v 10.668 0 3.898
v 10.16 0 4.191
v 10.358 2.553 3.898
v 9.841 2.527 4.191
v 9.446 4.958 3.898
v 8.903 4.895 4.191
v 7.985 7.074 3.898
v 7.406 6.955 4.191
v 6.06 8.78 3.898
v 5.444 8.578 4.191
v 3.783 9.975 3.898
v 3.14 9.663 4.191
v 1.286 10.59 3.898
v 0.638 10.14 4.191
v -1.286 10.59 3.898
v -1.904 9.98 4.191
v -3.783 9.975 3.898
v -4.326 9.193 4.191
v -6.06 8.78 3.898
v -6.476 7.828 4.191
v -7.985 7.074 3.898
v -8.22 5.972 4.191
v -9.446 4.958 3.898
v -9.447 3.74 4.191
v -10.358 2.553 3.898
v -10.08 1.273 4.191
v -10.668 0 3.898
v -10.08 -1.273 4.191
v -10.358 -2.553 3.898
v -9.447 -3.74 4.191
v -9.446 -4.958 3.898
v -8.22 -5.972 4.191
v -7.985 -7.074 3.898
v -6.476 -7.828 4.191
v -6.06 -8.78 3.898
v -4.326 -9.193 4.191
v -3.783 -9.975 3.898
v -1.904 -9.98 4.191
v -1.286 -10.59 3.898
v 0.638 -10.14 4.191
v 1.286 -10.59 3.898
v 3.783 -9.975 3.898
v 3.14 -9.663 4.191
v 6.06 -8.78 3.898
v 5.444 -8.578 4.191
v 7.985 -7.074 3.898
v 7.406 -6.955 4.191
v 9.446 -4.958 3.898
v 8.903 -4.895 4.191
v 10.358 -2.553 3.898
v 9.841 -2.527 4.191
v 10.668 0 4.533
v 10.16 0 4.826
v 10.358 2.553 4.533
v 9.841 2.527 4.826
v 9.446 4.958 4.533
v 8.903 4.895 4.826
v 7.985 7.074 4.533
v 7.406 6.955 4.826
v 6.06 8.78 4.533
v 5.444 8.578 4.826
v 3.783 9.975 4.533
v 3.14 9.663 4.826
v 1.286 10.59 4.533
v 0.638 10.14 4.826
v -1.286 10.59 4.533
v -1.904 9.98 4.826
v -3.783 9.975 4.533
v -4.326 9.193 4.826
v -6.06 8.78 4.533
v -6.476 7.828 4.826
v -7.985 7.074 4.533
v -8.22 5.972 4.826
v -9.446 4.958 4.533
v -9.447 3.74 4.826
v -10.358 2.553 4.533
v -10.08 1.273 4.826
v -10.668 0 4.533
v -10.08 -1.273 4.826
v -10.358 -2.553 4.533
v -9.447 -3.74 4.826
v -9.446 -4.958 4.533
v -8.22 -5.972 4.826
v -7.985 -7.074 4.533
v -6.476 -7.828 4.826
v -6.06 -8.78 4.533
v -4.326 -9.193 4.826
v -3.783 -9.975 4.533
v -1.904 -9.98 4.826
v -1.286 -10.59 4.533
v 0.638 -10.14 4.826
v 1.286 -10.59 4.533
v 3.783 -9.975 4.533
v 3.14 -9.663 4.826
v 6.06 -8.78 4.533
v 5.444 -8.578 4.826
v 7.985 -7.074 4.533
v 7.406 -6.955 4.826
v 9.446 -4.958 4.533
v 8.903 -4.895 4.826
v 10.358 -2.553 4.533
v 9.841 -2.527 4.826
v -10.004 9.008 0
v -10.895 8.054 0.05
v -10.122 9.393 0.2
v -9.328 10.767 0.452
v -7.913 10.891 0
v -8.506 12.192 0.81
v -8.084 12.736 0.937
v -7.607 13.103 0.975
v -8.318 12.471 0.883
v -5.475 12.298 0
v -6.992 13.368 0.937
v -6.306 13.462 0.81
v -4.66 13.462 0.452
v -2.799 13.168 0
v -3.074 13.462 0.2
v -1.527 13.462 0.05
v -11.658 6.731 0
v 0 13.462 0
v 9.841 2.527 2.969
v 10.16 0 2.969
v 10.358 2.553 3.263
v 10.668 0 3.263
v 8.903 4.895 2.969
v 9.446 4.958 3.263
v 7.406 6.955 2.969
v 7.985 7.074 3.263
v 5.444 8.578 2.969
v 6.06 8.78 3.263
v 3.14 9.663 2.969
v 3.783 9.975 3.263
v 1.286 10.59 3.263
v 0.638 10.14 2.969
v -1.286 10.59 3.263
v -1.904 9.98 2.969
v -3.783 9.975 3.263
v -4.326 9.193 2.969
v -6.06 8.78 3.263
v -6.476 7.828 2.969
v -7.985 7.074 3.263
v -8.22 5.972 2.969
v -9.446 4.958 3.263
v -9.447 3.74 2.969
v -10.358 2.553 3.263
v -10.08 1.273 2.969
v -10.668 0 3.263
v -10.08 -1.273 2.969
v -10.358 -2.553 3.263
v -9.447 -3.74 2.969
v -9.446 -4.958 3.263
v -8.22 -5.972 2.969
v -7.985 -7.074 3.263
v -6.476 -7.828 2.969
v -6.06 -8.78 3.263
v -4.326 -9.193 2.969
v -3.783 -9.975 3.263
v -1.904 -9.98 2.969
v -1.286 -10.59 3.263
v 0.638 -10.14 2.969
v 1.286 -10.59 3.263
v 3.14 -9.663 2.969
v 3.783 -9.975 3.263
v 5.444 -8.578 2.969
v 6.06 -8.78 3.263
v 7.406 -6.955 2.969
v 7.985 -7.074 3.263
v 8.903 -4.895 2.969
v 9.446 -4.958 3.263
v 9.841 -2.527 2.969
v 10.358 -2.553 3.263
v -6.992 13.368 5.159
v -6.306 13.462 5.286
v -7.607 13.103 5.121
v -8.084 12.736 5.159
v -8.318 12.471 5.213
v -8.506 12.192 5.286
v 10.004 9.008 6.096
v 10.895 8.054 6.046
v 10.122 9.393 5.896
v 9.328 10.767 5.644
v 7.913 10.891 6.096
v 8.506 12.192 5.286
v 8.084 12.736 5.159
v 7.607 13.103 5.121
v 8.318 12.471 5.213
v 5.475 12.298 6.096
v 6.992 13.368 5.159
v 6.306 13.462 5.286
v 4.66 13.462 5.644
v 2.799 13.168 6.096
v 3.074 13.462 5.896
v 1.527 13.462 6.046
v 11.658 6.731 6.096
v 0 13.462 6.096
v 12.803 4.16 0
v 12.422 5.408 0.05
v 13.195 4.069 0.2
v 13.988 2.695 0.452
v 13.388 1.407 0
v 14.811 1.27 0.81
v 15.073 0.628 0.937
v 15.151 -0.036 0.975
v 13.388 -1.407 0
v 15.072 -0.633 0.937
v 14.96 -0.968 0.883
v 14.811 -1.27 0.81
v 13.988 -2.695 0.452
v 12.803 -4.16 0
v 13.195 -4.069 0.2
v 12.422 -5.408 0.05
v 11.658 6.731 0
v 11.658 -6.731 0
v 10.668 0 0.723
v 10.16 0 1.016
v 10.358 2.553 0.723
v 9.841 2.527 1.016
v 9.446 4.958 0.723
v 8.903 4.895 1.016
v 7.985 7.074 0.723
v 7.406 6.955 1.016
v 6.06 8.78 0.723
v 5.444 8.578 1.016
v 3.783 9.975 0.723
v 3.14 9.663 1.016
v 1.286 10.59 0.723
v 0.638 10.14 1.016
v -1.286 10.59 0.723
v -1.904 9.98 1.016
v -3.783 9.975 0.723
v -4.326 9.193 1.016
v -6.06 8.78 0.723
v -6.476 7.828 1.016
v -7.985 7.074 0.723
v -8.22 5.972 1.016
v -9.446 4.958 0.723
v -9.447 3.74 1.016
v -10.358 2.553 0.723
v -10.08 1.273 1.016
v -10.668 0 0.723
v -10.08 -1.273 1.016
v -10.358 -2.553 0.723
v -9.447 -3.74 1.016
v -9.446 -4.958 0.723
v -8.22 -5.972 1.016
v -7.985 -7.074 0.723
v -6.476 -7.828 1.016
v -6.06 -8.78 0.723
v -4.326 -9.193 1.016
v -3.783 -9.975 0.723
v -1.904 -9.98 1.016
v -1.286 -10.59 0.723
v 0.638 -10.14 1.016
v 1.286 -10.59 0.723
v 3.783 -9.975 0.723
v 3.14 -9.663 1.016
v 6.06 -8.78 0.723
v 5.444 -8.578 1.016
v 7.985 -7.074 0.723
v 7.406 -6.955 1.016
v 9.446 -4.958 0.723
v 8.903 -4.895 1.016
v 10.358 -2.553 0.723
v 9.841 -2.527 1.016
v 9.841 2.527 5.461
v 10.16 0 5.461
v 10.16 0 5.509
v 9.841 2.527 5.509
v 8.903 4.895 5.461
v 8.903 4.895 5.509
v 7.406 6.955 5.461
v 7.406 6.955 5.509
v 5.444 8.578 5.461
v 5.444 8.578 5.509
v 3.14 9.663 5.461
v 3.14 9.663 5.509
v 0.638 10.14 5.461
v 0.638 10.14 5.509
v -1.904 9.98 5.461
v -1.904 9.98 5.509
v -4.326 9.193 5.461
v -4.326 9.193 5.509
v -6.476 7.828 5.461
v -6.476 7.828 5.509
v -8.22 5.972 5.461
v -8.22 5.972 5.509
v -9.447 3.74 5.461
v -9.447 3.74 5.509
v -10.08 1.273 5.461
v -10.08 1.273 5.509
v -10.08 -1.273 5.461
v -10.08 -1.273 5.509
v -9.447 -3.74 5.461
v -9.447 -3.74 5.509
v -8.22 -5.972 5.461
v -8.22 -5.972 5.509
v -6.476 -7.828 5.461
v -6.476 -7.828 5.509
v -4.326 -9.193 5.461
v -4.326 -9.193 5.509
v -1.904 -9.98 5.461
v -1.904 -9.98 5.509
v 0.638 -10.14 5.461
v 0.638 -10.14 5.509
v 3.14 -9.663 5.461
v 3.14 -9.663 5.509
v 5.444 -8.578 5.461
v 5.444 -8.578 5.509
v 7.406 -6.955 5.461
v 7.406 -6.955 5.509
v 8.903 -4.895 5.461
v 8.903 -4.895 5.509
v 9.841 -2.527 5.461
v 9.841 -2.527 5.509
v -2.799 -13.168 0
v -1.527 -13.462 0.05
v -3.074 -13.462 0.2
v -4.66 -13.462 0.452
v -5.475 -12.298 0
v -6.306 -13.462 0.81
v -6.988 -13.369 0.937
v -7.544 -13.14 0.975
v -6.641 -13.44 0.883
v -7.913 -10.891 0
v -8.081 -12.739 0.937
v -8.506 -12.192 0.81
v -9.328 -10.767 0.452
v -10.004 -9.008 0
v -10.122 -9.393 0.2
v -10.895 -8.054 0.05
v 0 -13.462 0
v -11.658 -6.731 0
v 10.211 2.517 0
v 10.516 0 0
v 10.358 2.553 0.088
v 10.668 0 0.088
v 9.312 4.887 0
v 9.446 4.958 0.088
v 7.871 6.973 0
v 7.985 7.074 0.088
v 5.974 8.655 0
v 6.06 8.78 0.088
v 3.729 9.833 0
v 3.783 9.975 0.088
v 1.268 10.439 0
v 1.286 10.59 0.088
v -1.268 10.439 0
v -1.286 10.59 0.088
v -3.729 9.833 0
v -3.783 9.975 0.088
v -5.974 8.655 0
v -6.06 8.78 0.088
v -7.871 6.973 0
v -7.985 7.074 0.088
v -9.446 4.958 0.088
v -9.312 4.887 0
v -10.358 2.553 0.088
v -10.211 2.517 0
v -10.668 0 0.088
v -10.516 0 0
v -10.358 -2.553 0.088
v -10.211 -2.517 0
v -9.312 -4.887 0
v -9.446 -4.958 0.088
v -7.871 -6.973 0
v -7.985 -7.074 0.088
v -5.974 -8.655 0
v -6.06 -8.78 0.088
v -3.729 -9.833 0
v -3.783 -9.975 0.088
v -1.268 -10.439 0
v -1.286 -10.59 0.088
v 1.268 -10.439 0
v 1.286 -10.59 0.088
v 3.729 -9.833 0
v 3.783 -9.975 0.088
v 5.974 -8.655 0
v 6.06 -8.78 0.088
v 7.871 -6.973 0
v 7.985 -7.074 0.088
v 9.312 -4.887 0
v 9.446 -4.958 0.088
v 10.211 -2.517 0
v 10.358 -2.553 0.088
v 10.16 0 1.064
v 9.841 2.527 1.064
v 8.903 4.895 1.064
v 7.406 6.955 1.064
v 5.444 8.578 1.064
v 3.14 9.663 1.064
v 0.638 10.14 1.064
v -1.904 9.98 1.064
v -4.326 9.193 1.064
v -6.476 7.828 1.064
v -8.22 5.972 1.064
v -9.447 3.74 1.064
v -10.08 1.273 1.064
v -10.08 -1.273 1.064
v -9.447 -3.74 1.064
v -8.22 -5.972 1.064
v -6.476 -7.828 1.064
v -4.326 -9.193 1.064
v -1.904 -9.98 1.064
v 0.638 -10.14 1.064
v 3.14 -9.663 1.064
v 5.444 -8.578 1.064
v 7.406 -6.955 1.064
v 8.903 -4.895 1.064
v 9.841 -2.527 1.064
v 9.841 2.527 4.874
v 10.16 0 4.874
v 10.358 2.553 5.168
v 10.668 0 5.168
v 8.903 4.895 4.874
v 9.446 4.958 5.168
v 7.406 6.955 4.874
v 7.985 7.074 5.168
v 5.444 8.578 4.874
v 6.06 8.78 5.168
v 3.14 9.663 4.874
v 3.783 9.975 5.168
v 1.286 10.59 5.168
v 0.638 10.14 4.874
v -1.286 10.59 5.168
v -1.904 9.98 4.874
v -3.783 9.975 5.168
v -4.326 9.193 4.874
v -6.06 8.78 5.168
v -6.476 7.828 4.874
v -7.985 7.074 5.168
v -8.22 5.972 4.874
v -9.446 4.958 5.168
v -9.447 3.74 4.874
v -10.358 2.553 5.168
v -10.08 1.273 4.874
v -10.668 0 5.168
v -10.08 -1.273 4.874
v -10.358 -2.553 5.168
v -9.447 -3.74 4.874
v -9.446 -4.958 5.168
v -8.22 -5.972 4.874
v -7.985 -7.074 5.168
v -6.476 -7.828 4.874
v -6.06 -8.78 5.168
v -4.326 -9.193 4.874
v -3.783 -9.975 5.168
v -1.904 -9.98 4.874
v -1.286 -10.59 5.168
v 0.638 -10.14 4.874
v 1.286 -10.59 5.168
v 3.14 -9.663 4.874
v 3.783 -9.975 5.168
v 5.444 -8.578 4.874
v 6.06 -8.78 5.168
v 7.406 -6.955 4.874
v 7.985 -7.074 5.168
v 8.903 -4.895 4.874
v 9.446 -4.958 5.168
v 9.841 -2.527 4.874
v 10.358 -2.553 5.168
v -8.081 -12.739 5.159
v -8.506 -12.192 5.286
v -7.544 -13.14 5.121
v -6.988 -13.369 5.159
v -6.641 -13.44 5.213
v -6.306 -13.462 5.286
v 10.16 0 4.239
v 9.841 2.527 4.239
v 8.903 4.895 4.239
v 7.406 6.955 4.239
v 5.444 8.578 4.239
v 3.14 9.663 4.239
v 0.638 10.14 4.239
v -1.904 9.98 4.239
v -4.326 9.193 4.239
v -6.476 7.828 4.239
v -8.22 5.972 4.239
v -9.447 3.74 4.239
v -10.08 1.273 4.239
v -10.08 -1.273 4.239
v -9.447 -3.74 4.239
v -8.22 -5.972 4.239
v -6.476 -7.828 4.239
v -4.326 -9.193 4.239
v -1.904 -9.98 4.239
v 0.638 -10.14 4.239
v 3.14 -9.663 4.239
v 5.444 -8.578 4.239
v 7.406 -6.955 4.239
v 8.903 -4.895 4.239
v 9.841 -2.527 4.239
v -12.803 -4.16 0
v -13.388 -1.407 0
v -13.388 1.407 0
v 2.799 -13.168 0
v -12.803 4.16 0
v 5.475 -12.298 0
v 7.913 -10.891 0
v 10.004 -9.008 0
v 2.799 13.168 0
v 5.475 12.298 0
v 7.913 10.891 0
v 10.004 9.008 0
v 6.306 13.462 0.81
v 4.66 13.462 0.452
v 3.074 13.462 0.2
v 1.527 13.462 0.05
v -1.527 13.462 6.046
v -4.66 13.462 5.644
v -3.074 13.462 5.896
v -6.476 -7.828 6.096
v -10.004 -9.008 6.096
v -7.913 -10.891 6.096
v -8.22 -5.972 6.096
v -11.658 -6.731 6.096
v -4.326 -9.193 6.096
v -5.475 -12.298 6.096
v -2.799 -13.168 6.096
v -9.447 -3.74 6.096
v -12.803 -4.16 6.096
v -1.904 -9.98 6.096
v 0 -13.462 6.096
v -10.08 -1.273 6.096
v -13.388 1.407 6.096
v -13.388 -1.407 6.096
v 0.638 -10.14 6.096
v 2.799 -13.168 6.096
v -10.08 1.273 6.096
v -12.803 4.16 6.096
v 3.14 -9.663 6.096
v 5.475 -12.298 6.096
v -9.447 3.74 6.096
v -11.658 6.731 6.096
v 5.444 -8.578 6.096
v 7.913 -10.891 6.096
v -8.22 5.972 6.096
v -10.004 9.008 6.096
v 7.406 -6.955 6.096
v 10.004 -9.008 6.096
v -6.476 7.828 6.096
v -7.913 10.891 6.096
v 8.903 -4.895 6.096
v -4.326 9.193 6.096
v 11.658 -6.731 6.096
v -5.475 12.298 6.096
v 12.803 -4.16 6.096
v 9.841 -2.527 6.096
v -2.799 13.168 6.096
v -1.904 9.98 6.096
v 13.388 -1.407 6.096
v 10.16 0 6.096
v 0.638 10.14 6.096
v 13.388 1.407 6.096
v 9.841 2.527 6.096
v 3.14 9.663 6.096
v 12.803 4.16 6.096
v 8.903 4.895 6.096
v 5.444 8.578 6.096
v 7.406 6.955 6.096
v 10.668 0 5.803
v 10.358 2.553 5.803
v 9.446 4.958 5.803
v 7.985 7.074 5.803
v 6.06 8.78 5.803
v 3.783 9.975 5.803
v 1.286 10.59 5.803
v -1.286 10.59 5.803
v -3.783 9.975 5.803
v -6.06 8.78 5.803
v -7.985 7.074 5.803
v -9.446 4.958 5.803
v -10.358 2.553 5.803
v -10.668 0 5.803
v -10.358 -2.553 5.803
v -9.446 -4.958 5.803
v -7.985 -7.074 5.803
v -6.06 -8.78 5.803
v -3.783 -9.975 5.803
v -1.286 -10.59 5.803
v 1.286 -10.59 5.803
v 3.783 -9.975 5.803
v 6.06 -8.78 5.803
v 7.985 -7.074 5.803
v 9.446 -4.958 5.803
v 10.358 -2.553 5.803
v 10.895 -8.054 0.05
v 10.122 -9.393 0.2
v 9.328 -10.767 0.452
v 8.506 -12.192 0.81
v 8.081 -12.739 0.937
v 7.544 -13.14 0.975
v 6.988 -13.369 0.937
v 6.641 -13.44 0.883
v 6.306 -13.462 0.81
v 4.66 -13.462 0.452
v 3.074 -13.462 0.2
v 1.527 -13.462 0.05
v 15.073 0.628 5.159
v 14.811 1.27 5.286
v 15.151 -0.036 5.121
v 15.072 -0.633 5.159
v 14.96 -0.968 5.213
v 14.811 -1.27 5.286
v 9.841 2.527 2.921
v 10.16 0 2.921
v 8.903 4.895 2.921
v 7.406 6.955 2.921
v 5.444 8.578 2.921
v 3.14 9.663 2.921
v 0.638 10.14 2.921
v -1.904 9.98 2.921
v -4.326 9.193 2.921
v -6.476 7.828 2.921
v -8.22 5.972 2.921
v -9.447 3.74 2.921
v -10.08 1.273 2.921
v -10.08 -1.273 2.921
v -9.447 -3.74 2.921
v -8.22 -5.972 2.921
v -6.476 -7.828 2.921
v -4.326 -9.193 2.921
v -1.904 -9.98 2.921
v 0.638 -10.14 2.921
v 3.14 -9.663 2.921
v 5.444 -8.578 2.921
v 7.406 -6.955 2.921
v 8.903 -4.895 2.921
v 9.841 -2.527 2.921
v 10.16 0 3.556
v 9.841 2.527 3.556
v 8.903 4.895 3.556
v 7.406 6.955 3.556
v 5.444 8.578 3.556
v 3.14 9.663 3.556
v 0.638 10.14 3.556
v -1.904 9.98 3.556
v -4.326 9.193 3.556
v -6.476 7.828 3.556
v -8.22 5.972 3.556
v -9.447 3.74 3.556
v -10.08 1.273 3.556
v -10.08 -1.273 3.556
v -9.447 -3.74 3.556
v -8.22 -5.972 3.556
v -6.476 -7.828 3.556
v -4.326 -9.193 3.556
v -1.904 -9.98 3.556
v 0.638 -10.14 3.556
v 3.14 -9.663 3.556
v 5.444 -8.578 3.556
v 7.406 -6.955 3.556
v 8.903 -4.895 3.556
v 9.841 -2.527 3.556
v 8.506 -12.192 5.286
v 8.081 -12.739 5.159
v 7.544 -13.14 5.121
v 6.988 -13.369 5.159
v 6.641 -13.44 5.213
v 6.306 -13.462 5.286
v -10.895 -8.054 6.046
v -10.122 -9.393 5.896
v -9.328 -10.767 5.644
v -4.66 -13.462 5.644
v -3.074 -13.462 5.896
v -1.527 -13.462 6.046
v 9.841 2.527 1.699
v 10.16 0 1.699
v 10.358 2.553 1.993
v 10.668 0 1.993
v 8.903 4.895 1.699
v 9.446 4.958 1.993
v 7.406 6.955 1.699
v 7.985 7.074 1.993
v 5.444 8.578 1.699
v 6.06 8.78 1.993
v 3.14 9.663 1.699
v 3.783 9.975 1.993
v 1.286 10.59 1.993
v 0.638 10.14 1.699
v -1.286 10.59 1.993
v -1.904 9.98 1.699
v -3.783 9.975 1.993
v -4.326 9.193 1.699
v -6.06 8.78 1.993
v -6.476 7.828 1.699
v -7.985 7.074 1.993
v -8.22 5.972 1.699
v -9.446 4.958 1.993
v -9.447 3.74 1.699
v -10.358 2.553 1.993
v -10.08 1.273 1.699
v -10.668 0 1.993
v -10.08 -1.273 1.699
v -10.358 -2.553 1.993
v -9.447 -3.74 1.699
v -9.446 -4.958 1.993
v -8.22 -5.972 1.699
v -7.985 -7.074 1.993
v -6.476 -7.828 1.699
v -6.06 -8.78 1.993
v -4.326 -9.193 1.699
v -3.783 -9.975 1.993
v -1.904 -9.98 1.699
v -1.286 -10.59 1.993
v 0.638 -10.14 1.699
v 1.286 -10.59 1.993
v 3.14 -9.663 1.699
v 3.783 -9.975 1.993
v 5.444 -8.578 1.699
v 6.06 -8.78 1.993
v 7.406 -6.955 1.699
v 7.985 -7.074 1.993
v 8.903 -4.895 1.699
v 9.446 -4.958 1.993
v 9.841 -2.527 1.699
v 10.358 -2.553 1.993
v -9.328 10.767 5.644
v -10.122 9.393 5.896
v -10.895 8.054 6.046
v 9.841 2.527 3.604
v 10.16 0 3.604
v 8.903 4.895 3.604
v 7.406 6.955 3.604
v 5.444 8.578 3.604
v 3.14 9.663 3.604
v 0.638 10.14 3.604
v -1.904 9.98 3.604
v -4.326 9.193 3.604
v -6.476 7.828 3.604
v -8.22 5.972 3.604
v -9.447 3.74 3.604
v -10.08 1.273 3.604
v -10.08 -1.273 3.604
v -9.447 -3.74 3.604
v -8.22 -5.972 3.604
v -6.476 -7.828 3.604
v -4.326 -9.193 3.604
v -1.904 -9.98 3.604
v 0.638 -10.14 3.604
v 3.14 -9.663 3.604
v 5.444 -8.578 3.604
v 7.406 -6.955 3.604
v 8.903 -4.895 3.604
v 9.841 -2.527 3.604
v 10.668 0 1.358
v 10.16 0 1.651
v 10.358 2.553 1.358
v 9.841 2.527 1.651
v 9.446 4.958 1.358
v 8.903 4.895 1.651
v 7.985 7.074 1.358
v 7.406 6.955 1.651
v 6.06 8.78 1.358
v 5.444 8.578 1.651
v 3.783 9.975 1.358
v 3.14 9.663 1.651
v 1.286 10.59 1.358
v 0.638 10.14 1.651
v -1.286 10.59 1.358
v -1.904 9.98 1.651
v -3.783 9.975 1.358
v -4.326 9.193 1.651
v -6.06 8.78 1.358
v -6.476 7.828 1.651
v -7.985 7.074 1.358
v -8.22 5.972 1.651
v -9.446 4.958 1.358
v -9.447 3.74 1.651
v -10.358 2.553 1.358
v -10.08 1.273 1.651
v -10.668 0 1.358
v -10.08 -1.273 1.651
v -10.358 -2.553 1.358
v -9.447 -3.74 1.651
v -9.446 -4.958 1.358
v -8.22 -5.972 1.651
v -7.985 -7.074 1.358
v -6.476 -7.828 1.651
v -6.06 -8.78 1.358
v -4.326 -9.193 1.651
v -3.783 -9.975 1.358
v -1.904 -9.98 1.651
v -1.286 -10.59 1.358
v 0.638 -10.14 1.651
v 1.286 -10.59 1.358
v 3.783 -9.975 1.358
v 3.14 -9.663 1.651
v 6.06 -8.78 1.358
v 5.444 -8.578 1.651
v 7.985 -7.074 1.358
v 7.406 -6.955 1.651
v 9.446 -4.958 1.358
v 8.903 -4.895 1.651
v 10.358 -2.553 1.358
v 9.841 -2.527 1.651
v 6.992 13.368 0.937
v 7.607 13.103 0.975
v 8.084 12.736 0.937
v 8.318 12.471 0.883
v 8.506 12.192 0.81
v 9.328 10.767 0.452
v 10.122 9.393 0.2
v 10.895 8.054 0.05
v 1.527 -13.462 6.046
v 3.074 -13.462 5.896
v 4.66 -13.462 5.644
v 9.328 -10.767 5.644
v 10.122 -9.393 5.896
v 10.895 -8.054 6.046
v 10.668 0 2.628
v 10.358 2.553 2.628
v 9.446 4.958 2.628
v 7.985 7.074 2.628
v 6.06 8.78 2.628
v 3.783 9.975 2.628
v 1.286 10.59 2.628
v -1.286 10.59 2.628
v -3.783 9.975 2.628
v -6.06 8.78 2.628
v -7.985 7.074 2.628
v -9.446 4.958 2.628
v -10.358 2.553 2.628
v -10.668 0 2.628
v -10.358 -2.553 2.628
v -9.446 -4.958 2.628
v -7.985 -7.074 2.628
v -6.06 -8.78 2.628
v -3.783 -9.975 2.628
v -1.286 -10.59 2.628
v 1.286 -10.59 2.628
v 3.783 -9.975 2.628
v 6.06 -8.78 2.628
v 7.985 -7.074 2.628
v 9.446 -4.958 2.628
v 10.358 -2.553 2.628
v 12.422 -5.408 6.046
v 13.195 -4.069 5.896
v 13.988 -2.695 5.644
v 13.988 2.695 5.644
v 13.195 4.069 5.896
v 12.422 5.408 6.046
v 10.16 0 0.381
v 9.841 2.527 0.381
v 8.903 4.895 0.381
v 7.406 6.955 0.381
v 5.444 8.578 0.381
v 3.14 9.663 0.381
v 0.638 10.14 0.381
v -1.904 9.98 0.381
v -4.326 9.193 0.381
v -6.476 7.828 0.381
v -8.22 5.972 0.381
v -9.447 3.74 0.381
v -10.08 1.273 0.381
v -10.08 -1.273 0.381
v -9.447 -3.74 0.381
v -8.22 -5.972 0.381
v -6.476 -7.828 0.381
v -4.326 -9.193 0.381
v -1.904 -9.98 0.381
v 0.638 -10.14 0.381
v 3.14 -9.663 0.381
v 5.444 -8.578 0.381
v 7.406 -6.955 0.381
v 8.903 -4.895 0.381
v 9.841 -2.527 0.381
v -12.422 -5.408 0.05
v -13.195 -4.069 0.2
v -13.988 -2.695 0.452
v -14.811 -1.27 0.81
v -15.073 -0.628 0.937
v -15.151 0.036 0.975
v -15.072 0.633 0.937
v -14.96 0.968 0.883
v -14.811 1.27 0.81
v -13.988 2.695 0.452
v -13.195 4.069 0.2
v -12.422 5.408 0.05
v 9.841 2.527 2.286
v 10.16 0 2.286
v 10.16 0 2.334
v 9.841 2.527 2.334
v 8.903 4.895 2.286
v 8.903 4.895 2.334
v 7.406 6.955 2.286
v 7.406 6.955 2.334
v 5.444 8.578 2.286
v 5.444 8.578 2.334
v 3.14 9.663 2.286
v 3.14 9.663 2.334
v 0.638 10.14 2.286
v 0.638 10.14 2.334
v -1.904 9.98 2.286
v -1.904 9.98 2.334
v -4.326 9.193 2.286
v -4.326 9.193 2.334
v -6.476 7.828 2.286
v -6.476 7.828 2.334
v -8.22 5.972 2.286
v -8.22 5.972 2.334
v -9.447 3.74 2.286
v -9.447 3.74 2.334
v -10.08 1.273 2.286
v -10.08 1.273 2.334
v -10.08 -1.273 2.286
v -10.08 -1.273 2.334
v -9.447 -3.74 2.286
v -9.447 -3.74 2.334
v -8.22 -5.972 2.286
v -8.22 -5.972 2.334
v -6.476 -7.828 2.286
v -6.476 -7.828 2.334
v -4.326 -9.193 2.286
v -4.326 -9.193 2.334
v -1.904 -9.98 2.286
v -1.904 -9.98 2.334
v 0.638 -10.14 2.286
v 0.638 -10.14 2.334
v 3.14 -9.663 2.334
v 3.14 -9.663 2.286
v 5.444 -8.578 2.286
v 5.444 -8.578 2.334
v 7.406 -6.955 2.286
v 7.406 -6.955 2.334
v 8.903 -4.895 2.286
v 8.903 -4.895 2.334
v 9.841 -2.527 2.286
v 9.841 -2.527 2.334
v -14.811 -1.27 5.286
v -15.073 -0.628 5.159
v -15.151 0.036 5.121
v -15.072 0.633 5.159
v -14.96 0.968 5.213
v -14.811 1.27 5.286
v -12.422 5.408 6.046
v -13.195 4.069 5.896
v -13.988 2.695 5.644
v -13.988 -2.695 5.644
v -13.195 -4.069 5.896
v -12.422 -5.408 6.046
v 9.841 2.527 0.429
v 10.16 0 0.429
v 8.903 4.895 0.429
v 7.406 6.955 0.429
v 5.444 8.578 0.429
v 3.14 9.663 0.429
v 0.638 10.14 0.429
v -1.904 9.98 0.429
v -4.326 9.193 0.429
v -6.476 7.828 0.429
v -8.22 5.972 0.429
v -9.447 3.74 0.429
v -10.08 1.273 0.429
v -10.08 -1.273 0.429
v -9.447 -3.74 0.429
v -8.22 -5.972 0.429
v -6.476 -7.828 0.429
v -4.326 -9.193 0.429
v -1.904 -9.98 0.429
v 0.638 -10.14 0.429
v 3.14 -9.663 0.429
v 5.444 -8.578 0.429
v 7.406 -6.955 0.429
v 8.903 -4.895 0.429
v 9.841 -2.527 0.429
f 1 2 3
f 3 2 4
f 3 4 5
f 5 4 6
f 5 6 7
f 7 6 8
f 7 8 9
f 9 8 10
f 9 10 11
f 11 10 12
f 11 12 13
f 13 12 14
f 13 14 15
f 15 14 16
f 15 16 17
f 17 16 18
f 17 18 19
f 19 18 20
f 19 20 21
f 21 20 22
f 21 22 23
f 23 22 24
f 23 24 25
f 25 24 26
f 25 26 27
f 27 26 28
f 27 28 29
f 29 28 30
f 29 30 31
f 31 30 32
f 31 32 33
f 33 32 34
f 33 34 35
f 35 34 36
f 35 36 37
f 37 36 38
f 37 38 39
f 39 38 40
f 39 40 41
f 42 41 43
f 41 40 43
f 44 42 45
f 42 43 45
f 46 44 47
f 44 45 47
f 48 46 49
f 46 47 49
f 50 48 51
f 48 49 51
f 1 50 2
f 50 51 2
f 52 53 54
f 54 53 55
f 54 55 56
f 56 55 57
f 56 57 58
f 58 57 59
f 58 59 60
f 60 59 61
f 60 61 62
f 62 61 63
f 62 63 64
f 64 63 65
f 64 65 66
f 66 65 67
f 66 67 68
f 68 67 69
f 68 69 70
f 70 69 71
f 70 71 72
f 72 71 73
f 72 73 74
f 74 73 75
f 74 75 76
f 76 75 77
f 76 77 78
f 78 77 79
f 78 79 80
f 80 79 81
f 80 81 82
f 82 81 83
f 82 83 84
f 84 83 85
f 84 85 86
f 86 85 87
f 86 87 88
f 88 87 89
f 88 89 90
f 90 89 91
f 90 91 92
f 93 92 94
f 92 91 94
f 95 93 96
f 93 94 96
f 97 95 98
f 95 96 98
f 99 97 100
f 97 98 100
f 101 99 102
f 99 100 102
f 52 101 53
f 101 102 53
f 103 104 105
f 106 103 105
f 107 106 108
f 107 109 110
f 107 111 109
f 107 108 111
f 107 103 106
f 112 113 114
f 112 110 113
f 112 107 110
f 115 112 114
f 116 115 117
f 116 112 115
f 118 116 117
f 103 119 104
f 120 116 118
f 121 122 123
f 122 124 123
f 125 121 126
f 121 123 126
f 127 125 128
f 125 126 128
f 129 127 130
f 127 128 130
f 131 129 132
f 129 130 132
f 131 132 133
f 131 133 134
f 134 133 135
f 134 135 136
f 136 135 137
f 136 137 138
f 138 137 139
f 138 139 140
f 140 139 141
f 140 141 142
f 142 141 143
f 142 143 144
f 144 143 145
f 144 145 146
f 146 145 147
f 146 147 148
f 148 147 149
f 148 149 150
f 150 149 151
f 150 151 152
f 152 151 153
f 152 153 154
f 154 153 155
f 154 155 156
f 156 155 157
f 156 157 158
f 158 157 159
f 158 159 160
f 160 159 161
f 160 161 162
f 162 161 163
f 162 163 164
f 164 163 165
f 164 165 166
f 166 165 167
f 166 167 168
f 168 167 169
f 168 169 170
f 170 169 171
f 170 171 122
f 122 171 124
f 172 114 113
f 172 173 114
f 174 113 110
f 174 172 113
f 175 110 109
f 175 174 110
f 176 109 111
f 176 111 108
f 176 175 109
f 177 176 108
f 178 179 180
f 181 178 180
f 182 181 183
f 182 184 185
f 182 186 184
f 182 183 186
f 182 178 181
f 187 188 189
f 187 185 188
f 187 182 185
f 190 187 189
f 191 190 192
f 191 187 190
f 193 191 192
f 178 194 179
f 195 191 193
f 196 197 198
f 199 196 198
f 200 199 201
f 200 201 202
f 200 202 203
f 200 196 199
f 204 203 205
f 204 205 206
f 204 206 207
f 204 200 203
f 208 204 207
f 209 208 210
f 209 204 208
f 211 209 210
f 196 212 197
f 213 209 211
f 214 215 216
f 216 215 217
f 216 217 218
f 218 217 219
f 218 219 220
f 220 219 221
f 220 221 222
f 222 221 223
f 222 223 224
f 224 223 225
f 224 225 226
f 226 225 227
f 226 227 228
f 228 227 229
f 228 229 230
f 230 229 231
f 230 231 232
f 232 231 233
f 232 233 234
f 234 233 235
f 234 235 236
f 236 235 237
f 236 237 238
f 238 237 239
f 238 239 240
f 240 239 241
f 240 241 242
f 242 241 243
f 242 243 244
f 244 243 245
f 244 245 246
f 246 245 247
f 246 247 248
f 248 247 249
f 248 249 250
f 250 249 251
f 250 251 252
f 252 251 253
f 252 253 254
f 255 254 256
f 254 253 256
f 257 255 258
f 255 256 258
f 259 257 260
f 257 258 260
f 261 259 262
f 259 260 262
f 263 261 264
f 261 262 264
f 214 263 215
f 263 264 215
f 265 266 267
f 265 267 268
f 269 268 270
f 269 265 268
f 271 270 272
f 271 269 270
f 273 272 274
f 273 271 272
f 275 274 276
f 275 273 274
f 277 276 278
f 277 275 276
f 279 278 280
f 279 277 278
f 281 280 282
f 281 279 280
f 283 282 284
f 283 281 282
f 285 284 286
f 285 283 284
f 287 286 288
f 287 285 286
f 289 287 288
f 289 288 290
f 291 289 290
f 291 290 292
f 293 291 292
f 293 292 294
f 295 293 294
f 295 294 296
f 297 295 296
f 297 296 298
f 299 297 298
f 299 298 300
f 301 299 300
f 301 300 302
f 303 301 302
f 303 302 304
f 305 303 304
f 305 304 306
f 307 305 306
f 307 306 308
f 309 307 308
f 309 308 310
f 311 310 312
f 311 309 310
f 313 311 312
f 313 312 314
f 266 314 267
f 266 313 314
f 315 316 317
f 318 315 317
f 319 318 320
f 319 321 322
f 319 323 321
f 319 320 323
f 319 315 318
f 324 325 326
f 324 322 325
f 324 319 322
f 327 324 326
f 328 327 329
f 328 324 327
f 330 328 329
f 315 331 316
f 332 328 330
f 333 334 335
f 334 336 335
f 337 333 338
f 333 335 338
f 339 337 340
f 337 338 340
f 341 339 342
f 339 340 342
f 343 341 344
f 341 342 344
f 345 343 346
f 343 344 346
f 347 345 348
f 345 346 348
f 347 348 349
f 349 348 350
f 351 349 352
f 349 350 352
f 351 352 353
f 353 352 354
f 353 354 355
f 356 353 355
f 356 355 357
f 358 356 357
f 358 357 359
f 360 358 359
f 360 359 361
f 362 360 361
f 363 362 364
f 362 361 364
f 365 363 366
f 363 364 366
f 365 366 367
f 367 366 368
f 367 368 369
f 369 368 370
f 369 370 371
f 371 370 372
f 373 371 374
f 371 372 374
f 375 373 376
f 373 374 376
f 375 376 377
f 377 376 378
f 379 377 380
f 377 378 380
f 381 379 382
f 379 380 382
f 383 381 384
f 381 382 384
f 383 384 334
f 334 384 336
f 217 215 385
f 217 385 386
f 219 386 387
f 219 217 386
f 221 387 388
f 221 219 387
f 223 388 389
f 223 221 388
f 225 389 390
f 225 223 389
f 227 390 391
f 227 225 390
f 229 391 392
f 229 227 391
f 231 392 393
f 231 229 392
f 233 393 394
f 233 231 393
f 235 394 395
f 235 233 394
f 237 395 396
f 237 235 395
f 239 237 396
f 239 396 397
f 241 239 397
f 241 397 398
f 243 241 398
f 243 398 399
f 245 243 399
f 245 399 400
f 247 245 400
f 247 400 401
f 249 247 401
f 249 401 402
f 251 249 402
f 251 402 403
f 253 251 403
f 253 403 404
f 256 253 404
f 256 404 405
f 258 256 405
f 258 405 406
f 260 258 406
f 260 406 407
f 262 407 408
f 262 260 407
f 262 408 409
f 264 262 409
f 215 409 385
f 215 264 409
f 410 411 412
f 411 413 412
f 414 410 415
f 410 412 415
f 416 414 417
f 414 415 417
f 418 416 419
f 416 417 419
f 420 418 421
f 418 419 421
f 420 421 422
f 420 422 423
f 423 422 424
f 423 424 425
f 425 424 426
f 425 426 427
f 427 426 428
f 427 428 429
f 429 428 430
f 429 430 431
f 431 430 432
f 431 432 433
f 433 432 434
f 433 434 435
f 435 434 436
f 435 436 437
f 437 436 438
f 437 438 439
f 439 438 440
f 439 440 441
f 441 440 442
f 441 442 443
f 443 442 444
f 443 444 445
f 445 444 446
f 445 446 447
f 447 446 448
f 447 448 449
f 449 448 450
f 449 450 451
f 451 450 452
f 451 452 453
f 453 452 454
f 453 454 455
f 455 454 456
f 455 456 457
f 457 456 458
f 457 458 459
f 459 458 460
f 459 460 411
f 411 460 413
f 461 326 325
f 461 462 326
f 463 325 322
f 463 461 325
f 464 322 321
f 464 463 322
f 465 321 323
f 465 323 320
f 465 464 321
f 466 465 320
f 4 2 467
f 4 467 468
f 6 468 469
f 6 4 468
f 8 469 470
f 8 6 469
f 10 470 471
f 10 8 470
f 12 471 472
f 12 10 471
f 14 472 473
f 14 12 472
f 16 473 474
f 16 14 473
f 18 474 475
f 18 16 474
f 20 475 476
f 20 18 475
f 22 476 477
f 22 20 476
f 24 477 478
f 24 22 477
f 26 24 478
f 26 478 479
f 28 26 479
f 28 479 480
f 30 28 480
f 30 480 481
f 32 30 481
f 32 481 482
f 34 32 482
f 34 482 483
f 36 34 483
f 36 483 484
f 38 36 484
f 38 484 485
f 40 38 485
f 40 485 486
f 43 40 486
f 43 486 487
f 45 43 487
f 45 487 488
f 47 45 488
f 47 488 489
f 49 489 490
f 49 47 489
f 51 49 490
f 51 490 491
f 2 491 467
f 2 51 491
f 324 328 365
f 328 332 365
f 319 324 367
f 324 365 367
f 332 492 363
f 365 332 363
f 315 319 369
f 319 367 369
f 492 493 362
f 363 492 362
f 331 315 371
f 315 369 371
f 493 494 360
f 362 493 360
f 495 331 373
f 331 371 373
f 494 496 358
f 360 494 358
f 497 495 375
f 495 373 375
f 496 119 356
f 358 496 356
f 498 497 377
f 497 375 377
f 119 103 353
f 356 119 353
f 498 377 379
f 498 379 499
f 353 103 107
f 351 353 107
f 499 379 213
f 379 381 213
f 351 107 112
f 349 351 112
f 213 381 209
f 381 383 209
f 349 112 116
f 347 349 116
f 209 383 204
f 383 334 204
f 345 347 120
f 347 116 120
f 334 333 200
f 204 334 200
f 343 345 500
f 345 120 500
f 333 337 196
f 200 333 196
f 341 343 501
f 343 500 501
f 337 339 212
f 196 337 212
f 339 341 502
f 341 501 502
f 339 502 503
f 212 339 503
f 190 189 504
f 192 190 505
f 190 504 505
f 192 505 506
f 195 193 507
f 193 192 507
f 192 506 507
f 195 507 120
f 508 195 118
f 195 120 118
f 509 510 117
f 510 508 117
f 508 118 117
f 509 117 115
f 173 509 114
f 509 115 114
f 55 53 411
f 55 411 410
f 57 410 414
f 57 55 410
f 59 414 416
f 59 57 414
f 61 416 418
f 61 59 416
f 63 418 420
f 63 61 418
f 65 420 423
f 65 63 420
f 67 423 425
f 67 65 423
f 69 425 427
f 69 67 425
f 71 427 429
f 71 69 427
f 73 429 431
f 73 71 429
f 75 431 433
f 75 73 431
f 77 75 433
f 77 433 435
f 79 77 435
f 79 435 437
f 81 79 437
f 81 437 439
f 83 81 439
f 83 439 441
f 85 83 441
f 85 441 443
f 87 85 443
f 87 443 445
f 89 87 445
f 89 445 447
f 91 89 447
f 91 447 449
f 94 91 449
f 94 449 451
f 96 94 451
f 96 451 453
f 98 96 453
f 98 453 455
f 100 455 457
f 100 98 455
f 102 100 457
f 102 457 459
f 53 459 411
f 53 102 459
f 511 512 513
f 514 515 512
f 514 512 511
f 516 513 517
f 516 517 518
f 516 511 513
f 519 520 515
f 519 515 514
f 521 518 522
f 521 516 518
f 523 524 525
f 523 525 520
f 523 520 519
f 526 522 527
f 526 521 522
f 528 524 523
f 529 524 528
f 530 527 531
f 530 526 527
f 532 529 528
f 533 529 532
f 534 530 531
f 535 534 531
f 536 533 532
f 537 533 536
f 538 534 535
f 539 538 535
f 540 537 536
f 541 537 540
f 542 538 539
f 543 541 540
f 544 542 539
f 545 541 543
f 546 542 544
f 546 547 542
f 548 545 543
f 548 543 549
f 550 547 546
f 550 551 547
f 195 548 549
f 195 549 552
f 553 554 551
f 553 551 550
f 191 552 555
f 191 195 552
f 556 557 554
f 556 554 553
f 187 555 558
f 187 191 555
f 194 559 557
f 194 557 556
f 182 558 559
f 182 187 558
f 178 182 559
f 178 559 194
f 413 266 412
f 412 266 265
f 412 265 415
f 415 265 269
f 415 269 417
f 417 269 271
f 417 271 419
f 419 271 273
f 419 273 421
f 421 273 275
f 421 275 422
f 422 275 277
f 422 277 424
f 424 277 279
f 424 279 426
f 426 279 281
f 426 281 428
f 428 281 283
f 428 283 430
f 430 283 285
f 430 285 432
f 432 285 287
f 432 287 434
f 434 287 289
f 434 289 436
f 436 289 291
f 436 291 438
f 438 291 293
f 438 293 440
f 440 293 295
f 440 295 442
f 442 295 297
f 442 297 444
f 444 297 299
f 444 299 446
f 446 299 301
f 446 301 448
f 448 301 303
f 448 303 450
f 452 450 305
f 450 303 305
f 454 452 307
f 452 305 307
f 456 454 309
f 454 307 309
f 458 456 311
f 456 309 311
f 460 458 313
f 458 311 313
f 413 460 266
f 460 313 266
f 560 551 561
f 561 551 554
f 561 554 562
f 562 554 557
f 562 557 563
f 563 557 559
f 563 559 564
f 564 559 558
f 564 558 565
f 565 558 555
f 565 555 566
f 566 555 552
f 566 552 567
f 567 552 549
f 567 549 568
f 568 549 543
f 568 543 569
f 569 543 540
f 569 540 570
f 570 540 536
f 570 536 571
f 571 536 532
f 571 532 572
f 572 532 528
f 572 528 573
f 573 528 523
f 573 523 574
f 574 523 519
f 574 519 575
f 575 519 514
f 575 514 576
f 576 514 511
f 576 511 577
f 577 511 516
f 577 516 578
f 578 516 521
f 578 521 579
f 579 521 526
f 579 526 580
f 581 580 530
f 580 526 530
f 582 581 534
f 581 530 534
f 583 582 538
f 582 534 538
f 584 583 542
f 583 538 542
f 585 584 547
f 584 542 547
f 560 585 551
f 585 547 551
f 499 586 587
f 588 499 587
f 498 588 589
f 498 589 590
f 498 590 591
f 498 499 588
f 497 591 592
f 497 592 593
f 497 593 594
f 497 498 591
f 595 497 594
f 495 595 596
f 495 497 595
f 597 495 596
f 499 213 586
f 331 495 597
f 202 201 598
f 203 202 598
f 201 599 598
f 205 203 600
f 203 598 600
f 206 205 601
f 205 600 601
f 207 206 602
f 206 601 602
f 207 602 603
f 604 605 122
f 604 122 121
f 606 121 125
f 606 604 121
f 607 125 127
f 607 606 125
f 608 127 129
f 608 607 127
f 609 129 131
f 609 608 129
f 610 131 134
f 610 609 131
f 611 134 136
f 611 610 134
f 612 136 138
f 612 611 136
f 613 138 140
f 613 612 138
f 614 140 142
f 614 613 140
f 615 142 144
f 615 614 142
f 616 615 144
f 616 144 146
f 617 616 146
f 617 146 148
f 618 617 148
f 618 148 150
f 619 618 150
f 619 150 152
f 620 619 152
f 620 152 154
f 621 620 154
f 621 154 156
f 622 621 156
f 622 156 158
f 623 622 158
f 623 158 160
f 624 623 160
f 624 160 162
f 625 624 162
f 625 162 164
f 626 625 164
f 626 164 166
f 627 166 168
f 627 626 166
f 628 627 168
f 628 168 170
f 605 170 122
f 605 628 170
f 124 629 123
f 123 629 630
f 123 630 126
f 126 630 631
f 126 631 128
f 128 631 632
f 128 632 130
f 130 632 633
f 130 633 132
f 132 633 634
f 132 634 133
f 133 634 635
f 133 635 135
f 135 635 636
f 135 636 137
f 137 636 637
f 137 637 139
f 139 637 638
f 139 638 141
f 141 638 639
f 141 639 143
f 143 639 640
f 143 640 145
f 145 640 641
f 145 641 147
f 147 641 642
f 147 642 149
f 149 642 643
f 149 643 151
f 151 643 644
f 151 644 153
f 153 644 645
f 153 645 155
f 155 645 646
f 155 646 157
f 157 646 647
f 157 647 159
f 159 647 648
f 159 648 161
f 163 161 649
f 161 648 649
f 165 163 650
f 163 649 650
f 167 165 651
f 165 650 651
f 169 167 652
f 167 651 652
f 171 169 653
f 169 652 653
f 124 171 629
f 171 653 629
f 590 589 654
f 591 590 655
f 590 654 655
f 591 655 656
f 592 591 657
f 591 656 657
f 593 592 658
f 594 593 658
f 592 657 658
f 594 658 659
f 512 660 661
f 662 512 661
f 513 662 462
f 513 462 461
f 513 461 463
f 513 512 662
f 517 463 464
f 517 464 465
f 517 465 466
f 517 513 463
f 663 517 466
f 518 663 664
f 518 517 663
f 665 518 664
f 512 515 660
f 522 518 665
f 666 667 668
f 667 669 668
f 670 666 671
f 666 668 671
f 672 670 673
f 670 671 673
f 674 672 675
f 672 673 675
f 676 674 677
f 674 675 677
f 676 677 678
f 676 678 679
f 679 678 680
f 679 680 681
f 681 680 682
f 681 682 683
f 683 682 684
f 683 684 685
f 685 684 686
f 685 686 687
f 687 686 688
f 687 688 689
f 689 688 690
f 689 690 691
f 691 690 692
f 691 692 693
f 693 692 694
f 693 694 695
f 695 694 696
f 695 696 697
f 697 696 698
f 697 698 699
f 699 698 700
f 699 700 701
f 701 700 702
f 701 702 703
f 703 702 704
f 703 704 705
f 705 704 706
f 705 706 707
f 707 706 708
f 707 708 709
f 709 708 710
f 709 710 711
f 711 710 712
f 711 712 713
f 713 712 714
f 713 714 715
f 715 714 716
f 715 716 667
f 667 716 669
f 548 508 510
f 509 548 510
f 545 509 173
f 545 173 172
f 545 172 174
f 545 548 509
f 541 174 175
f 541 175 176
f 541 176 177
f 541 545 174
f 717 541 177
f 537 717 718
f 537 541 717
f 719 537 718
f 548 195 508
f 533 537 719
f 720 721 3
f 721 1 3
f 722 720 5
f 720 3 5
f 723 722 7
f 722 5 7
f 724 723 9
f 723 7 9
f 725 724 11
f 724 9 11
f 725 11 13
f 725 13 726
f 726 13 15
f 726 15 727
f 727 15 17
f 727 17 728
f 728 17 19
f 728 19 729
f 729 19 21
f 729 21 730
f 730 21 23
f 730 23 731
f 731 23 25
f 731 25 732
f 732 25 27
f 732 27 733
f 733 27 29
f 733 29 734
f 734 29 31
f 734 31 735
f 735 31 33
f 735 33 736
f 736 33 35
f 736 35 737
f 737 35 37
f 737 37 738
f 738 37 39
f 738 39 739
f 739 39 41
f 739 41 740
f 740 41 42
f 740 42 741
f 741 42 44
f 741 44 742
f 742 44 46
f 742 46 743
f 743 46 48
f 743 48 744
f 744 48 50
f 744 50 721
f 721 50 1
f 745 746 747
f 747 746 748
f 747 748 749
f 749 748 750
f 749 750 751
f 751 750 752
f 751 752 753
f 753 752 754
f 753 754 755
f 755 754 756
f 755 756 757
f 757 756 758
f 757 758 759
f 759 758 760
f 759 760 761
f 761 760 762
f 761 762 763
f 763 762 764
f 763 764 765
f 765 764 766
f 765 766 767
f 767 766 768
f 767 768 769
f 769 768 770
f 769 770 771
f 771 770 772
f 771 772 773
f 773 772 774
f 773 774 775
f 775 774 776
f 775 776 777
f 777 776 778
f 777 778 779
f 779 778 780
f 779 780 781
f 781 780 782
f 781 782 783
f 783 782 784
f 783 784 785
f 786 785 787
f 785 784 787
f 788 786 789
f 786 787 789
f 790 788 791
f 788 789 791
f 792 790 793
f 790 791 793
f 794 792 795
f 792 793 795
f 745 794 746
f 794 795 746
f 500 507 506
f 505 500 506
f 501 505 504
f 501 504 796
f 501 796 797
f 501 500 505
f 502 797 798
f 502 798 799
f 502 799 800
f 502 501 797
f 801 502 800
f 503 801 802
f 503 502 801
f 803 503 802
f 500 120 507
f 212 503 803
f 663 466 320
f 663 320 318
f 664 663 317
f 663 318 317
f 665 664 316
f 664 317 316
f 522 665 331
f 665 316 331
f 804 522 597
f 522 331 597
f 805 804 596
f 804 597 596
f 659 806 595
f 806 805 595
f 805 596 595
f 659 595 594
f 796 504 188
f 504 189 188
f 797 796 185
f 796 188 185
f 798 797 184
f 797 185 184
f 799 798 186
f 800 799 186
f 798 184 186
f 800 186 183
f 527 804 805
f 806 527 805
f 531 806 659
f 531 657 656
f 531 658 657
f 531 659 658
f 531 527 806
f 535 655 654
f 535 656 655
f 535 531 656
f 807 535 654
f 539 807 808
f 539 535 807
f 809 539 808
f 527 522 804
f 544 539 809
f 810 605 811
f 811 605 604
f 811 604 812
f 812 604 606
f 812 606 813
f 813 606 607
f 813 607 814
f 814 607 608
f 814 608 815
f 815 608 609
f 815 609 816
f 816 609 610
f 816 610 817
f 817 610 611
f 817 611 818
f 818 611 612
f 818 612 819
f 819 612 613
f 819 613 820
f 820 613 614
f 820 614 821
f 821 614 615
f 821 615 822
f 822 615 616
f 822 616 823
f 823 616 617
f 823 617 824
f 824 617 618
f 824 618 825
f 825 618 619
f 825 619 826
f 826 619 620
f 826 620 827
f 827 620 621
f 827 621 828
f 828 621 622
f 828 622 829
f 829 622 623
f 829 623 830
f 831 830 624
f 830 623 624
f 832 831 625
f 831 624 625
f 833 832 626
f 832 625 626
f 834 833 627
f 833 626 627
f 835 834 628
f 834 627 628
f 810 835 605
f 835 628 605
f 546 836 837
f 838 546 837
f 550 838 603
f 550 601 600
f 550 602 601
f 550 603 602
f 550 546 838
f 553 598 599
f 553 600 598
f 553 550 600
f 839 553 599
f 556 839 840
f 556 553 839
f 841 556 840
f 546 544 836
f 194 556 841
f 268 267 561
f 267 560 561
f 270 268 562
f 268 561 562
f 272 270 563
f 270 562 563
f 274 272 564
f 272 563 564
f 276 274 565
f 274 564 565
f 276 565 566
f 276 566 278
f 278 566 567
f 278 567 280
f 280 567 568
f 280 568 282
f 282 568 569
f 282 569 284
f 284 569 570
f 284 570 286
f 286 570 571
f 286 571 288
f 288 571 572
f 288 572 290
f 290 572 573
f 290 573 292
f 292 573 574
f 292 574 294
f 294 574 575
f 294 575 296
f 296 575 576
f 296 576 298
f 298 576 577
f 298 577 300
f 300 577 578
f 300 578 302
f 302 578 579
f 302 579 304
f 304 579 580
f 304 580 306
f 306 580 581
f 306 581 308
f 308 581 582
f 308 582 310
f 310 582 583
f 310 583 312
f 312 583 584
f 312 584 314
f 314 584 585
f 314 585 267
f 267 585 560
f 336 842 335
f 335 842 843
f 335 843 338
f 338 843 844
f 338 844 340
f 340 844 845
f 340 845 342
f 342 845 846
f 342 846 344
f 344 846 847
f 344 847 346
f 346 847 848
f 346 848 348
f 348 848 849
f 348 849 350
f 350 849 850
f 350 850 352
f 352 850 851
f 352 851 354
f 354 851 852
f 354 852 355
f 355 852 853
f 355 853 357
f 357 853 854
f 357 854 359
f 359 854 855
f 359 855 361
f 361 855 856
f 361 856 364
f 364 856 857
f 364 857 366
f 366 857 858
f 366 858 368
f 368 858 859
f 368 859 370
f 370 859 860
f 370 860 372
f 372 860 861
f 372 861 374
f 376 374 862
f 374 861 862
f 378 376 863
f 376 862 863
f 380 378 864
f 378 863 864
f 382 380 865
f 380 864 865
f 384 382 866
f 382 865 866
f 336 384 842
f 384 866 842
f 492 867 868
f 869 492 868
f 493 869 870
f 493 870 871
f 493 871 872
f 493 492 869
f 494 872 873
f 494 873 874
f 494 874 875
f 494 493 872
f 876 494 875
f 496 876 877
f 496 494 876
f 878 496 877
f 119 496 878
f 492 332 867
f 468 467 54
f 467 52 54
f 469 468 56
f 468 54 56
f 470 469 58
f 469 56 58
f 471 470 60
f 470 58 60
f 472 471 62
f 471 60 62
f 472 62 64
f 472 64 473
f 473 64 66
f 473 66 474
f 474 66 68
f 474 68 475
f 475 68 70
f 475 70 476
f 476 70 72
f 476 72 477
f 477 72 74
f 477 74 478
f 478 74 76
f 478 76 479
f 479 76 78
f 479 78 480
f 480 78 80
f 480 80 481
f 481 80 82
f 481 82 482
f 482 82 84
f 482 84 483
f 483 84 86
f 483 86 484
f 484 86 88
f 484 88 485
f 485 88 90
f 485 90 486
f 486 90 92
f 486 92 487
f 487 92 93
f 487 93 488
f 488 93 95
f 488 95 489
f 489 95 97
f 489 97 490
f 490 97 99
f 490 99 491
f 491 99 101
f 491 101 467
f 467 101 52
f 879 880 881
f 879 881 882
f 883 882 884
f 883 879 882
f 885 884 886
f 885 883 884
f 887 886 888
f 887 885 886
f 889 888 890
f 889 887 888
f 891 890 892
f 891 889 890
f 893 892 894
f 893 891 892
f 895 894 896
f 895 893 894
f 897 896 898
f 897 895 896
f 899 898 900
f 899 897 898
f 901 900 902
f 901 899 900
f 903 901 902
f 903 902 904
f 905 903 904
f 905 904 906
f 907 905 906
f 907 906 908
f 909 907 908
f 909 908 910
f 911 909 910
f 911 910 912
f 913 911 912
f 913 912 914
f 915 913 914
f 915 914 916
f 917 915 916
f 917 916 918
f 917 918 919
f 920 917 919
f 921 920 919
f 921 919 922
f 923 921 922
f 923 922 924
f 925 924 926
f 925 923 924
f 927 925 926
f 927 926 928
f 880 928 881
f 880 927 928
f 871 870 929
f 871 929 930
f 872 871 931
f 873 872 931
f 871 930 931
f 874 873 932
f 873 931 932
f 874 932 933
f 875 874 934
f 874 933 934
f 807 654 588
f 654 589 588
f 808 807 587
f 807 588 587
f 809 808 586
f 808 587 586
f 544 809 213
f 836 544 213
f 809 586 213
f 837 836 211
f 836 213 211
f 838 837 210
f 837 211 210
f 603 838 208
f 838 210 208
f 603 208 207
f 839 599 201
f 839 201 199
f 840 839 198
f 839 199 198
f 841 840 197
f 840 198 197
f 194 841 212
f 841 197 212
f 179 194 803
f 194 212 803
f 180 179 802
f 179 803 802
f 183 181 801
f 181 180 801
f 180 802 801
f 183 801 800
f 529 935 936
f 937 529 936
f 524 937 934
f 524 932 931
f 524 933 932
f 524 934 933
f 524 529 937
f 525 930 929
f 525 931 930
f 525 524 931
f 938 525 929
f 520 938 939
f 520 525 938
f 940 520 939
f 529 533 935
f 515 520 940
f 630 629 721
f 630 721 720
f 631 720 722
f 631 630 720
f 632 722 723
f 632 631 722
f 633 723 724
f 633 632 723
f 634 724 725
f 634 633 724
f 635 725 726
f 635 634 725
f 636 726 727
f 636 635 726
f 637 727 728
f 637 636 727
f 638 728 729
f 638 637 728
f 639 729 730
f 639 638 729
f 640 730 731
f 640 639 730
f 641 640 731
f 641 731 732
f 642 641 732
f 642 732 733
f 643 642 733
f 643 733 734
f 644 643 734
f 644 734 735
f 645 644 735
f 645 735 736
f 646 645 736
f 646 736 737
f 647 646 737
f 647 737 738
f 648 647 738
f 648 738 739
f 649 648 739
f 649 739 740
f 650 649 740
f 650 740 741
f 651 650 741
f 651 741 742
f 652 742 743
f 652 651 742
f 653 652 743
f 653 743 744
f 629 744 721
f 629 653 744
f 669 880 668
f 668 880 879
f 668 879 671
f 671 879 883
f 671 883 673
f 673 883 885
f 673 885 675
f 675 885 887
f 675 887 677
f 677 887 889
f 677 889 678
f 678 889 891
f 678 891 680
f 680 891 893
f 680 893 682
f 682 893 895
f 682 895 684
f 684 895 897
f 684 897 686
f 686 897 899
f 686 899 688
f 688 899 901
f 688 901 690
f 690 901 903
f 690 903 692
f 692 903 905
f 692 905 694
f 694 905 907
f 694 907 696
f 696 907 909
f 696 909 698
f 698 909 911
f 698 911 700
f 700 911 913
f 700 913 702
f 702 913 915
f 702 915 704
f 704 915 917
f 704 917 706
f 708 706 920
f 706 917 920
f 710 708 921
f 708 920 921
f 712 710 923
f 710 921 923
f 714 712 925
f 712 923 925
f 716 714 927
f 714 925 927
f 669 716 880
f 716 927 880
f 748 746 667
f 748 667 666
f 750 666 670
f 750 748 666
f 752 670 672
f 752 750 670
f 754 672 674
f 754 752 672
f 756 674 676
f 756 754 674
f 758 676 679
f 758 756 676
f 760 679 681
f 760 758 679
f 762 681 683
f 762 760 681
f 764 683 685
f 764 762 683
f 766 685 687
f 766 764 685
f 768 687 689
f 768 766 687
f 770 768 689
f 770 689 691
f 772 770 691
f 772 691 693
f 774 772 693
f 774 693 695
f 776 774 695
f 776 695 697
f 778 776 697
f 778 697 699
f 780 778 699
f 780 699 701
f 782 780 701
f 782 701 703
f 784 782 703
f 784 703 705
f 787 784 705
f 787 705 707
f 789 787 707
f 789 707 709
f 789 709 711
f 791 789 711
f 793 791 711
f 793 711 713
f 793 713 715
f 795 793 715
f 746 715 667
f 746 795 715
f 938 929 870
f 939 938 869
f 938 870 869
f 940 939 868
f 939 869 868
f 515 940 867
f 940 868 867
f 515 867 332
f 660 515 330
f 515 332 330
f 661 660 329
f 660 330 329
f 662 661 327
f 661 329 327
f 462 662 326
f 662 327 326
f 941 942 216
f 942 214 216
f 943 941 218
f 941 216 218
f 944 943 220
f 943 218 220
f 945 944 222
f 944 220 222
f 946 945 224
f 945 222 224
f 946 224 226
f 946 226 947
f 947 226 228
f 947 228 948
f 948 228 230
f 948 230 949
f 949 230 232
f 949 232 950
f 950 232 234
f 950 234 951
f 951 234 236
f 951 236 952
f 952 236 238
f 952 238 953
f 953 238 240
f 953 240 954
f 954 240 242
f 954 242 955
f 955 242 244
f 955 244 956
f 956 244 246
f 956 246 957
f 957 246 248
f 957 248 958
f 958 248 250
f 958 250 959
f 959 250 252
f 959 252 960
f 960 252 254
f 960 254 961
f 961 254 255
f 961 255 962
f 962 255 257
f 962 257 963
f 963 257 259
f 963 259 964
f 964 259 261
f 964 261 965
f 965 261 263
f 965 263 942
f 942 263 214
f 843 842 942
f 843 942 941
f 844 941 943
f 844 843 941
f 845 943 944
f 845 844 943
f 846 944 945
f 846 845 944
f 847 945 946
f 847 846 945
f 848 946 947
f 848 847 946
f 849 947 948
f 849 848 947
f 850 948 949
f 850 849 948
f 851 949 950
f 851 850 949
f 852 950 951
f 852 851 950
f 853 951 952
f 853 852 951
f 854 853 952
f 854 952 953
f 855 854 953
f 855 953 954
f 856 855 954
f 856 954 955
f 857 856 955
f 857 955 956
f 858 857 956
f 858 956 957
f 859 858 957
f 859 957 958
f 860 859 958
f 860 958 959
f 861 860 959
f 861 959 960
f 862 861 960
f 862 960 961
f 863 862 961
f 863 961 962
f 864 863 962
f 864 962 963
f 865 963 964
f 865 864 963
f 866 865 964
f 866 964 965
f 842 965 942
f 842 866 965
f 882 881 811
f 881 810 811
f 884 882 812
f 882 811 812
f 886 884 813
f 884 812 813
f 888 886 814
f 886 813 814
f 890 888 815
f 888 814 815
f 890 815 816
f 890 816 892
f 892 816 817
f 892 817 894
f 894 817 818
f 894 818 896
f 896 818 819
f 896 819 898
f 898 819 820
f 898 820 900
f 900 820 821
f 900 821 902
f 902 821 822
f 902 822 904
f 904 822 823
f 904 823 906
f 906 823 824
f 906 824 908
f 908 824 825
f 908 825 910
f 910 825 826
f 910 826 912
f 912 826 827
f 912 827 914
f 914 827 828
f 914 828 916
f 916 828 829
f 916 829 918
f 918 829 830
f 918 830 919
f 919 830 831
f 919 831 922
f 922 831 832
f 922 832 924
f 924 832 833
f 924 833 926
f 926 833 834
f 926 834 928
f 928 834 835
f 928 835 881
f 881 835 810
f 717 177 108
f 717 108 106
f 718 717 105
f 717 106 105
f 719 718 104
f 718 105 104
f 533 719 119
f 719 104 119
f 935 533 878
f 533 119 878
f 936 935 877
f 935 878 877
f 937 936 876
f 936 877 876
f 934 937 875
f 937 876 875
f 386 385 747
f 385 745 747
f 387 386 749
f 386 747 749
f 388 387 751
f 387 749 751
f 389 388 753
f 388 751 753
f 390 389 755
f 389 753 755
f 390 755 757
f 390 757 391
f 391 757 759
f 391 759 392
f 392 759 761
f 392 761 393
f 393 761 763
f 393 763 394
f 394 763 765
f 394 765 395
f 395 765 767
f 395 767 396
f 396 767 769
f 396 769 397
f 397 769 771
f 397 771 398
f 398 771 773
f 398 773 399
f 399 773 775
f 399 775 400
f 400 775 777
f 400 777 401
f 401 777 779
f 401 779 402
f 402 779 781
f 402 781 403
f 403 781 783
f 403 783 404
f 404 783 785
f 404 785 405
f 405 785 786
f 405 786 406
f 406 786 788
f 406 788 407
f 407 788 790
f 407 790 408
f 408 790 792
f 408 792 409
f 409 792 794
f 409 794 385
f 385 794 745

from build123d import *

# Parameters (mm, degrees)
SKETCH1_R          = 10.16
EXTRUDE1_DEPTH     = 6.096
SKETCH2_OUTSIDE_W  = 65.986
SKETCH2_OUTSIDE_H  = 61.82
SKETCH2_OUTSIDE_R  = 13.462
CUT_EXTRUDE1_DEPTH = 7.096
CUT_EXTRUDE1_DRAFT = -60
SKETCH3_OUTSIDE_W  = 65.986
SKETCH3_OUTSIDE_H  = 61.82
SKETCH3_OUTSIDE_R  = 13.462
CUT_EXTRUDE2_DEPTH = 7.096
CUT_EXTRUDE2_DRAFT = -60
FILLET1_R          = 2.54
LPATTERN1_COUNT    = 10
LPATTERN1_PITCH    = 0.635


with BuildPart() as part:
    # Sketch1 → Extrude1 (new body)
    with BuildSketch(Plane.XY):
        Polygon((-15.544578648, 0), (-7.772289324, -13.462), (7.772289324, -13.462), (15.544578648, 0), (7.772289324, 13.462), (-7.772289324, 13.462), align=None)
        Circle(SKETCH1_R, mode=Mode.SUBTRACT)
    extrude(amount=EXTRUDE1_DEPTH)


with BuildPart() as cut_extrude1_tool:
    # Sketch2 outside → Cut-Extrude1 (with draft: the straight prism first)
    with BuildSketch(Plane.XY.offset(6.096)):
        Rectangle(SKETCH2_OUTSIDE_W, SKETCH2_OUTSIDE_H)
        Circle(SKETCH2_OUTSIDE_R, mode=Mode.SUBTRACT)
    extrude(amount=-CUT_EXTRUDE1_DEPTH)
    # Cut-Extrude1: the draft: its side faces are tilted about the plane it starts from
    cut_extrude1_sides = [cut_extrude1_tool.faces().sort_by_distance(p)[0] for p in [
        (0, -30.91, 2.548),
        (32.993, 0, 2.548),
        (0, 30.91, 2.548),
        (-32.993, 0, 2.548),
        (-13.462, 0, 2.548),
    ]]
    draft(cut_extrude1_sides, Plane.XY.offset(6.096), CUT_EXTRUDE1_DRAFT)


with BuildPart() as part_1:
    add(part.part)

    # Cut-Extrude1: cut by cut_extrude1_tool
    add(cut_extrude1_tool.part, mode=Mode.SUBTRACT)


with BuildPart() as cut_extrude2_tool:
    # Sketch3 outside → Cut-Extrude2 (with draft: the straight prism first)
    with BuildSketch(Plane(origin=(0, 0, 0), x_dir=(-1, 0, 0), z_dir=(0, 0, -1))):
        Rectangle(SKETCH3_OUTSIDE_W, SKETCH3_OUTSIDE_H)
        Circle(SKETCH3_OUTSIDE_R, mode=Mode.SUBTRACT)
    extrude(amount=-CUT_EXTRUDE2_DEPTH)
    # Cut-Extrude2: the draft: its side faces are tilted about the plane it starts from
    cut_extrude2_sides = [cut_extrude2_tool.faces().sort_by_distance(p)[0] for p in [
        (0, -30.91, 3.548),
        (-32.993, 0, 3.548),
        (0, 30.91, 3.548),
        (32.993, 0, 3.548),
        (13.462, 0, 3.548),
    ]]
    draft(cut_extrude2_sides, Plane(origin=(0, 0, 0), x_dir=(-1, 0, 0), z_dir=(0, 0, -1)), CUT_EXTRUDE2_DRAFT)


with BuildPart() as part_2:
    add(part_1.part)

    # Cut-Extrude2: cut by cut_extrude2_tool
    add(cut_extrude2_tool.part, mode=Mode.SUBTRACT)

    # Fillet1
    fillet1_edges = [part_2.edges().sort_by_distance(p)[0] for p in [
        (15.544578648, 0, 3.048),
        (7.772289324, -13.462, 3.048),
        (-7.772289324, -13.462, 3.048),
        (-15.544578648, 0, 3.048),
        (-7.772289324, 13.462, 3.048),
        (7.772289324, 13.462, 3.048),
    ]]
    fillet(fillet1_edges, radius=FILLET1_R)

    # Sketch4 → Cut-Revolve1 (revolve, cut)
    with BuildSketch(Plane(origin=(0, 0, 0), x_dir=(1, 0, 0), z_dir=(0, 1, 0)), mode=Mode.PRIVATE) as cut_revolve1_sk:
        Polygon((-10.16, -6.096), (-10.16, -5.509412127), (-10.668, -5.802706063), align=None)
    cut_revolve1 = revolve(cut_revolve1_sk.sketch.rotate(Axis((0, 0, 0), (0, 0, 1)), 180), axis=Axis((0, 0, 0), (0, 0, 1)), mode=Mode.SUBTRACT)  # turned: the seam where the file's is

    # LPattern1: Cut-Revolve1 ×10
    with Locations(*[(0, 0, -i * LPATTERN1_PITCH) for i in range(1, LPATTERN1_COUNT)]):
        add(cut_revolve1, mode=Mode.SUBTRACT)


solid = part_2.part
